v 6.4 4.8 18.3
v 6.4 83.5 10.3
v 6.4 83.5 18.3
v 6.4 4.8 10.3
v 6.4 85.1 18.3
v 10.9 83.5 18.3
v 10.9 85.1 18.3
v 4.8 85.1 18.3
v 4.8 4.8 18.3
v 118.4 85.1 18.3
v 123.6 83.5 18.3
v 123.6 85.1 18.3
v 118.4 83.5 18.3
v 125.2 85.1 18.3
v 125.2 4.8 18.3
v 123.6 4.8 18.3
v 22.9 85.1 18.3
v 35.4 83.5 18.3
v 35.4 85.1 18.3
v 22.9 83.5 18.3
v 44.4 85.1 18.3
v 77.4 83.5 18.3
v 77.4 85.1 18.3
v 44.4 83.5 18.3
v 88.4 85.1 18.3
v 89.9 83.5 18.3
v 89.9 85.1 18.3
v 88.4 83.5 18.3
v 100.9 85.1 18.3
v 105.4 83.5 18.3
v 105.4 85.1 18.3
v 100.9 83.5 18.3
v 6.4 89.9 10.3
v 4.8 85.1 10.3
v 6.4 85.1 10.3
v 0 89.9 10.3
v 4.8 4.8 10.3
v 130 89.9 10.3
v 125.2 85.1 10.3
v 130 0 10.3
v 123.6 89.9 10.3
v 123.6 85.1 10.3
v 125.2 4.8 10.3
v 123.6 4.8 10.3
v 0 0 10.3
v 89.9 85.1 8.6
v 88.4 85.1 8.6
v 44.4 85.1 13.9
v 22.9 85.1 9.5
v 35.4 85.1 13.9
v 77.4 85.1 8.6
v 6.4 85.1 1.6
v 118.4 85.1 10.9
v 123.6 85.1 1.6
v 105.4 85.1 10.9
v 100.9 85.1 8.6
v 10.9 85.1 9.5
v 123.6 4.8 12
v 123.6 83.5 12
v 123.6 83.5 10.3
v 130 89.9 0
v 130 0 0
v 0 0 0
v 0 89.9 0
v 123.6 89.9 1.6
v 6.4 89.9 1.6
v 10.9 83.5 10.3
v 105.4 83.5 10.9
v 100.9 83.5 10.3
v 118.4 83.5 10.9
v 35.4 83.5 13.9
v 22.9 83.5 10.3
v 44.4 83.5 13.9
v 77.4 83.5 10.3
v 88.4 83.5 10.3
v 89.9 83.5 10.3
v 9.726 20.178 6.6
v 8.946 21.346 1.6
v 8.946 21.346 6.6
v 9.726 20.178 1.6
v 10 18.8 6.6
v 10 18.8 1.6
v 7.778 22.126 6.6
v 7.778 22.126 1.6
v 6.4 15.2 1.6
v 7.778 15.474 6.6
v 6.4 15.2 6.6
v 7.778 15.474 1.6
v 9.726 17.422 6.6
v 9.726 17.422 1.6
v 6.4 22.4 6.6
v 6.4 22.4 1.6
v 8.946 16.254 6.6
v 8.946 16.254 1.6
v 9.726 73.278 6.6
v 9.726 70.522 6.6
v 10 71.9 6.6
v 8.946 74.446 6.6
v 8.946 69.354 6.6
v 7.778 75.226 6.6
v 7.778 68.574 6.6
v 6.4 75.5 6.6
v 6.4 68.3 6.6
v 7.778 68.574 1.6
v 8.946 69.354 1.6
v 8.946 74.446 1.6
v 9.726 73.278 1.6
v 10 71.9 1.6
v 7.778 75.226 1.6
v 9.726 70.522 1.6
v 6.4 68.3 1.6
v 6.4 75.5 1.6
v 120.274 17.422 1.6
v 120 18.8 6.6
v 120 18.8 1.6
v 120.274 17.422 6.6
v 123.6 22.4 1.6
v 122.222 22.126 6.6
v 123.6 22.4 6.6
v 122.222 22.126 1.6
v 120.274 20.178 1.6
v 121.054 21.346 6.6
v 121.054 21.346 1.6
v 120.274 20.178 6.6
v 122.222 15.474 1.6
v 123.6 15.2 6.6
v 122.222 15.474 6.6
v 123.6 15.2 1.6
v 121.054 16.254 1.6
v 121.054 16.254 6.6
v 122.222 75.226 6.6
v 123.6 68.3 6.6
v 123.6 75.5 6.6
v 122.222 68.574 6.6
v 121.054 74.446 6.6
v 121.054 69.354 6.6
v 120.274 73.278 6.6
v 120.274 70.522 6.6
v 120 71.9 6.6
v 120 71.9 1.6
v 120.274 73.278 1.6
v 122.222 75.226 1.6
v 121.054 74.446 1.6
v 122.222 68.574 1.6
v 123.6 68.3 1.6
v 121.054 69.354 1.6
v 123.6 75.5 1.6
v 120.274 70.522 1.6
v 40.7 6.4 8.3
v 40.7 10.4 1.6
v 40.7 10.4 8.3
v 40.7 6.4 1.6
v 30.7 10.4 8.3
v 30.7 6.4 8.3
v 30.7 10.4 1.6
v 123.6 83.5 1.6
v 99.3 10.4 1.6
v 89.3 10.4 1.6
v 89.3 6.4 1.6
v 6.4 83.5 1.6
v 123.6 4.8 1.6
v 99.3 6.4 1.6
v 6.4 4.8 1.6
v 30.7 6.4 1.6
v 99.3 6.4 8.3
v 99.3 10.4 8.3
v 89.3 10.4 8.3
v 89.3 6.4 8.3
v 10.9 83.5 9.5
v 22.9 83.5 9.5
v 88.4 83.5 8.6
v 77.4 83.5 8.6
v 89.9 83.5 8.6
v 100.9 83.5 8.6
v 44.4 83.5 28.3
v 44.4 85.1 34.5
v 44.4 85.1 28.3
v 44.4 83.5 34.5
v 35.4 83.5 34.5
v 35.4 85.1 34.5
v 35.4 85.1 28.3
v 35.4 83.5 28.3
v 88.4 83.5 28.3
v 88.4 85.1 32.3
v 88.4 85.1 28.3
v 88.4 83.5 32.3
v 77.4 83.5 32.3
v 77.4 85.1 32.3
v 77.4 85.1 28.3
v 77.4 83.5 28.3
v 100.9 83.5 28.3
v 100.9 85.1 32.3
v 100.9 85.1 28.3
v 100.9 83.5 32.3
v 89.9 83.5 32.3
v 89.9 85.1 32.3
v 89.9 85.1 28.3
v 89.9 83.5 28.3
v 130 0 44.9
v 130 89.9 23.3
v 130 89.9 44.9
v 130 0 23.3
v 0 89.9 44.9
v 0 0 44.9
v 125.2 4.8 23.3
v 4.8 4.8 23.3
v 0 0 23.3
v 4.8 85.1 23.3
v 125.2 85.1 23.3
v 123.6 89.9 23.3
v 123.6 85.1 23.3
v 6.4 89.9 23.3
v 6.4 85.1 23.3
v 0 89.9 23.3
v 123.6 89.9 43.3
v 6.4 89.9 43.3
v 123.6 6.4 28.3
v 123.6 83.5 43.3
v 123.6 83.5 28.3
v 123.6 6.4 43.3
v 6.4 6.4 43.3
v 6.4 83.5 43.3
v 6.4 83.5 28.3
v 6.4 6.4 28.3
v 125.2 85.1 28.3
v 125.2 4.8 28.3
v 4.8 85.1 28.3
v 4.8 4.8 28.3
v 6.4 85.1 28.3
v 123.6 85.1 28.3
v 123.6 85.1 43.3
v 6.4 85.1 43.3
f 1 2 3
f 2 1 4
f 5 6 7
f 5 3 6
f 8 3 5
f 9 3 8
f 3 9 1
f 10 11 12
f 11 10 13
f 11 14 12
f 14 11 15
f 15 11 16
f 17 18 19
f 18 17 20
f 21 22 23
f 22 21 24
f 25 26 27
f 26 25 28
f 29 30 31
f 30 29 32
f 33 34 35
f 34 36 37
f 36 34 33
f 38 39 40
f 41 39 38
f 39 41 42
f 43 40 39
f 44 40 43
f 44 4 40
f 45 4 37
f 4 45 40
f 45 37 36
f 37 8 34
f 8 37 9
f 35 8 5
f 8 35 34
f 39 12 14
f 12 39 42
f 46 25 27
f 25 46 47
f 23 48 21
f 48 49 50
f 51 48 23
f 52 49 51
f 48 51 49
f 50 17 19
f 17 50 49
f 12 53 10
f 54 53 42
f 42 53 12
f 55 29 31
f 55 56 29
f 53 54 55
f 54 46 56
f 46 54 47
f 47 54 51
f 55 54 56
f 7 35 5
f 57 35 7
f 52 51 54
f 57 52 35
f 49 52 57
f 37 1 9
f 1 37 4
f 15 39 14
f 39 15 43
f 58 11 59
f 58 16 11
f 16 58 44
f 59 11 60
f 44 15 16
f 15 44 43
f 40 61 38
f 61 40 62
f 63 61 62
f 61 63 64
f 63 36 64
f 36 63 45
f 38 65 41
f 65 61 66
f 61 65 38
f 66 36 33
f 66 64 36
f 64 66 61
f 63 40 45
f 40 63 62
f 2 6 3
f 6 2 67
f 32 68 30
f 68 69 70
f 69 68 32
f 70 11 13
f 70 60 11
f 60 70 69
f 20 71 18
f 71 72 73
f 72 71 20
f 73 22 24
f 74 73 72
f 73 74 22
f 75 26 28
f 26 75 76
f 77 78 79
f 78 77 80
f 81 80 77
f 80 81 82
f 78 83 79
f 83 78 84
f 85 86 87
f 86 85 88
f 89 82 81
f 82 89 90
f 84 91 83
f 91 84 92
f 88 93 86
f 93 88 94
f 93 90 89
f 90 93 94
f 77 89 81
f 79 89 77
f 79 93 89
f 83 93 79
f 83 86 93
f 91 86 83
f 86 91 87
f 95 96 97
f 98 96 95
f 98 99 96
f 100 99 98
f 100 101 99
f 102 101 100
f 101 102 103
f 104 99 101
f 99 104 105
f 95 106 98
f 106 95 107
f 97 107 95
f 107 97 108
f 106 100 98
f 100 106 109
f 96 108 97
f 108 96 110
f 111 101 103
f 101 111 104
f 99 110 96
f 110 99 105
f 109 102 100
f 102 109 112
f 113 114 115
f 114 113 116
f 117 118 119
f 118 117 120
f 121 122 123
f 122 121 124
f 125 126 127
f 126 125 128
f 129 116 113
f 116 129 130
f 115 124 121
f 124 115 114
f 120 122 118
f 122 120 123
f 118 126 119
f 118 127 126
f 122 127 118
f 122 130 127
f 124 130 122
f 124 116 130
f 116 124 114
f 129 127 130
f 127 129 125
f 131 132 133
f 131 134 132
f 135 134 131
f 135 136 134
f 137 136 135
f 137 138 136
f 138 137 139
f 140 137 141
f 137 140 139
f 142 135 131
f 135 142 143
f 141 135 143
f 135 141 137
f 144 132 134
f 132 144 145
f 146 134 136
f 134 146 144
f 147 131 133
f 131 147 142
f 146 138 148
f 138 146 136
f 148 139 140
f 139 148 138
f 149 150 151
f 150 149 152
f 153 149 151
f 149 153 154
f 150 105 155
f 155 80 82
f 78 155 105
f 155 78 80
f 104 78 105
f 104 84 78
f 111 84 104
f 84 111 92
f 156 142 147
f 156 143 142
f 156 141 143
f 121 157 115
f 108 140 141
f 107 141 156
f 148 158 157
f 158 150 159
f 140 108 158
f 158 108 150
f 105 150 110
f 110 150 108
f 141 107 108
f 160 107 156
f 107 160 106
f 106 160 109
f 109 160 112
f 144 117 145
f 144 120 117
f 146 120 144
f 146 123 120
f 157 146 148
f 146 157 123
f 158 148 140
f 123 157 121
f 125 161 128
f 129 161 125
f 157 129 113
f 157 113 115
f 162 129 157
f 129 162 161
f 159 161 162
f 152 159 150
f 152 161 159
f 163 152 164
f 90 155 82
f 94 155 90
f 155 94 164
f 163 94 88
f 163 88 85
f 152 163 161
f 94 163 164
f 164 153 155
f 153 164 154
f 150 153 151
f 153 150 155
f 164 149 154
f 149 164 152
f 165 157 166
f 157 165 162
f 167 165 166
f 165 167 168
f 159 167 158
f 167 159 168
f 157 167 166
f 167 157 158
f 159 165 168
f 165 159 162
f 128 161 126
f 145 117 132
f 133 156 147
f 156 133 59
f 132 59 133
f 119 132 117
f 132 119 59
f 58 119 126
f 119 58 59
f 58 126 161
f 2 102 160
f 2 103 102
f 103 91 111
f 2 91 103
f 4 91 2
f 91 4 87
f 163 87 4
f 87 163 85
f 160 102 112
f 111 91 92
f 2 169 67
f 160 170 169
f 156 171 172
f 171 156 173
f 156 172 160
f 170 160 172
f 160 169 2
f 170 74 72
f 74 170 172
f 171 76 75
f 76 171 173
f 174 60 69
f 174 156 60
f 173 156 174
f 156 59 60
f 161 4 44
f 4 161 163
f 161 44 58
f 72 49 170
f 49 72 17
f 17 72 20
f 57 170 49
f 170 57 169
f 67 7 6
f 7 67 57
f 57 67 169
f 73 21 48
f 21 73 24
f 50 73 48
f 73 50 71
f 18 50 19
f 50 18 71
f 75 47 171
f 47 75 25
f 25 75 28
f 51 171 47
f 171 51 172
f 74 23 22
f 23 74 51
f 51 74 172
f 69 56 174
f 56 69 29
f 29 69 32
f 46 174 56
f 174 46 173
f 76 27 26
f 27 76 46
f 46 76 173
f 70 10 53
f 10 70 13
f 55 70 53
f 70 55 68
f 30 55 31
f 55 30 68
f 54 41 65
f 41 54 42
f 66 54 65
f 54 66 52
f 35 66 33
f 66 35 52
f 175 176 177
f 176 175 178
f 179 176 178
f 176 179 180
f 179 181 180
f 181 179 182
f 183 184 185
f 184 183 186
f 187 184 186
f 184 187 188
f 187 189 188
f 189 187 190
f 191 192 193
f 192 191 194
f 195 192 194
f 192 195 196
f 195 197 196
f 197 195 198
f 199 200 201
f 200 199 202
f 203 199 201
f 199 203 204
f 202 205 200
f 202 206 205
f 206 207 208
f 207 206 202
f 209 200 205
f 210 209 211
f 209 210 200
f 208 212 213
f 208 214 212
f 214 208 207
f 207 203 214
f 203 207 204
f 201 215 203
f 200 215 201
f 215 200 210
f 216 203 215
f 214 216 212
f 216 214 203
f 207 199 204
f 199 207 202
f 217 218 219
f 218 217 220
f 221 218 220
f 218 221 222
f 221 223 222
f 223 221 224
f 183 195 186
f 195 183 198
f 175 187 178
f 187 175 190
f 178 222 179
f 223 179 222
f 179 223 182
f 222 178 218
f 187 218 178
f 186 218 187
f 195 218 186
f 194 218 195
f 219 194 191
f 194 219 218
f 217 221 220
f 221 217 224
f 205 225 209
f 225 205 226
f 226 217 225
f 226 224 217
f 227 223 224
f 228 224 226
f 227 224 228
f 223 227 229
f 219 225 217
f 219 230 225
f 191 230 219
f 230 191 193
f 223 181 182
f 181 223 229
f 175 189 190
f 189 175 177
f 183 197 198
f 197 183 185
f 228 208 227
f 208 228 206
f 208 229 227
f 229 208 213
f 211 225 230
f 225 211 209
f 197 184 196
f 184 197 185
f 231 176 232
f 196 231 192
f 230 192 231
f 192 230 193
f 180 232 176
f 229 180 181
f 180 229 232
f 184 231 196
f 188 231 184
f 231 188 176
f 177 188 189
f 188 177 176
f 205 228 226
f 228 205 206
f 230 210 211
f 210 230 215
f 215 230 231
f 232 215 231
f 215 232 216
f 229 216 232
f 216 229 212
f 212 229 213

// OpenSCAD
nozzle_width = 0.4;
wall_thickness = 4 * nozzle_width;
t = wall_thickness;

pcb_width = 117.2;
pcb_depth = 73.1;
pcb_height = 1.7;
pcb_clearance_led = 4;
pcb_led_height = 2;
pcb_clearance_below = 5;
pcb_clearance_top = 23;
pcb_holder_radius = 3.6;
pcb_holder_y_pos = 10;
overlap = 5;
gap = 3;
front_lid_holder_width = 10;

case_wall_thickness = 4 * t;
case_width = case_wall_thickness + pcb_width+case_wall_thickness;
case_depth = case_wall_thickness + pcb_clearance_led + pcb_depth + case_wall_thickness;
lower_half_height = t + pcb_clearance_below + pcb_height + pcb_led_height;
upper_half_height = t + pcb_clearance_top - gap;

//        x-pos, z-pos, width, height
cutouts = [[ 4.5, -0.4, 12.0,  5.8], // audio in
           [29.0,  4.0,  9.0, 10.9],     // power in
           [71.0, -1.3, 11.0, 14.0], // audio out left
           [83.5, -1.3, 11.0, 14.0], // audio out right
           [99.0,  1.0, 13.0,  6.5]]; // usb power out

module lower_half() {
    difference() {
        union() {
            cube([case_width, case_depth, lower_half_height]);

            for (x=[case_wall_thickness-t, case_wall_thickness+pcb_width]) {
                translate([x, case_wall_thickness-t, lower_half_height])
                    cube([t, t+pcb_clearance_led+pcb_depth+t, gap+overlap]);
            }
            
            translate([case_wall_thickness, case_wall_thickness+pcb_clearance_led+pcb_depth, lower_half_height])
                cube([pcb_width, t, gap+overlap]);
        }
    
        translate([case_wall_thickness, case_wall_thickness-t, t])
        difference() {
            cube([pcb_width, t+pcb_depth+pcb_clearance_led, lower_half_height+0.1]);
            
            for (x=[0, pcb_width]) {
                for (y=[pcb_holder_y_pos, pcb_depth-pcb_holder_y_pos]) {
                    translate([x, pcb_clearance_led+y, -0.1])
                        cylinder(r=pcb_holder_radius, h=pcb_clearance_below+0.1, $fn=16);
                }
            }
            
            for (x=[-1, 1]) {
                translate([pcb_width/2+x*pcb_width/4-front_lid_holder_width/2, t, 0])
                    cube([front_lid_holder_width, pcb_clearance_led, pcb_clearance_below+pcb_height]);
            }
        }

        for (cutout = cutouts) {
            xpos = cutout[0];
            zpos = cutout[1];
            width = cutout[2];
            
            translate([case_wall_thickness+xpos, case_wall_thickness+pcb_clearance_led+pcb_depth-0.1, 2*t+pcb_clearance_below+pcb_height+zpos])
                cube([width, case_wall_thickness+0.2, 30]);
        }
        
        translate([case_wall_thickness, case_depth-case_wall_thickness+t, t])
            cube([pcb_width, case_depth+0.1, 30]);
    }
}

module upper_half() {
    difference() {
        cube([case_width, case_depth, upper_half_height]);
        
        translate([case_wall_thickness, case_wall_thickness, -0.1])
            cube([case_width-2*case_wall_thickness, case_depth-2*case_wall_thickness, upper_half_height-t+0.1]);

        translate([case_wall_thickness-t, case_wall_thickness-t, -0.1])
            #cube([case_width-2*case_wall_thickness+2*t, case_depth-2*case_wall_thickness+2*t, overlap+0.1]);

        translate([case_wall_thickness, case_depth-case_wall_thickness+t, -0.1])
            cube([pcb_width, case_depth+0.1, upper_half_height-t+0.1]);

        translate([case_wall_thickness, case_depth-case_wall_thickness+t-0.1, -0.1])
            cube([pcb_width, case_depth+0.1, overlap]);

        for (cutout = cutouts) {
            xpos = cutout[0];
            zpos = cutout[1];
            width = cutout[2];
            height = cutout[3];
            
            translate([case_wall_thickness+xpos, case_wall_thickness+pcb_clearance_led+pcb_depth-0.1, -(pcb_clearance_below+pcb_height)+gap+zpos])
                #cube([width, case_wall_thickness+0.2, height]);
        }
    }
}

lower_half();

translate([0, 0, lower_half_height+gap+10])
//rotate([0, 180, 0])
upper_half();
